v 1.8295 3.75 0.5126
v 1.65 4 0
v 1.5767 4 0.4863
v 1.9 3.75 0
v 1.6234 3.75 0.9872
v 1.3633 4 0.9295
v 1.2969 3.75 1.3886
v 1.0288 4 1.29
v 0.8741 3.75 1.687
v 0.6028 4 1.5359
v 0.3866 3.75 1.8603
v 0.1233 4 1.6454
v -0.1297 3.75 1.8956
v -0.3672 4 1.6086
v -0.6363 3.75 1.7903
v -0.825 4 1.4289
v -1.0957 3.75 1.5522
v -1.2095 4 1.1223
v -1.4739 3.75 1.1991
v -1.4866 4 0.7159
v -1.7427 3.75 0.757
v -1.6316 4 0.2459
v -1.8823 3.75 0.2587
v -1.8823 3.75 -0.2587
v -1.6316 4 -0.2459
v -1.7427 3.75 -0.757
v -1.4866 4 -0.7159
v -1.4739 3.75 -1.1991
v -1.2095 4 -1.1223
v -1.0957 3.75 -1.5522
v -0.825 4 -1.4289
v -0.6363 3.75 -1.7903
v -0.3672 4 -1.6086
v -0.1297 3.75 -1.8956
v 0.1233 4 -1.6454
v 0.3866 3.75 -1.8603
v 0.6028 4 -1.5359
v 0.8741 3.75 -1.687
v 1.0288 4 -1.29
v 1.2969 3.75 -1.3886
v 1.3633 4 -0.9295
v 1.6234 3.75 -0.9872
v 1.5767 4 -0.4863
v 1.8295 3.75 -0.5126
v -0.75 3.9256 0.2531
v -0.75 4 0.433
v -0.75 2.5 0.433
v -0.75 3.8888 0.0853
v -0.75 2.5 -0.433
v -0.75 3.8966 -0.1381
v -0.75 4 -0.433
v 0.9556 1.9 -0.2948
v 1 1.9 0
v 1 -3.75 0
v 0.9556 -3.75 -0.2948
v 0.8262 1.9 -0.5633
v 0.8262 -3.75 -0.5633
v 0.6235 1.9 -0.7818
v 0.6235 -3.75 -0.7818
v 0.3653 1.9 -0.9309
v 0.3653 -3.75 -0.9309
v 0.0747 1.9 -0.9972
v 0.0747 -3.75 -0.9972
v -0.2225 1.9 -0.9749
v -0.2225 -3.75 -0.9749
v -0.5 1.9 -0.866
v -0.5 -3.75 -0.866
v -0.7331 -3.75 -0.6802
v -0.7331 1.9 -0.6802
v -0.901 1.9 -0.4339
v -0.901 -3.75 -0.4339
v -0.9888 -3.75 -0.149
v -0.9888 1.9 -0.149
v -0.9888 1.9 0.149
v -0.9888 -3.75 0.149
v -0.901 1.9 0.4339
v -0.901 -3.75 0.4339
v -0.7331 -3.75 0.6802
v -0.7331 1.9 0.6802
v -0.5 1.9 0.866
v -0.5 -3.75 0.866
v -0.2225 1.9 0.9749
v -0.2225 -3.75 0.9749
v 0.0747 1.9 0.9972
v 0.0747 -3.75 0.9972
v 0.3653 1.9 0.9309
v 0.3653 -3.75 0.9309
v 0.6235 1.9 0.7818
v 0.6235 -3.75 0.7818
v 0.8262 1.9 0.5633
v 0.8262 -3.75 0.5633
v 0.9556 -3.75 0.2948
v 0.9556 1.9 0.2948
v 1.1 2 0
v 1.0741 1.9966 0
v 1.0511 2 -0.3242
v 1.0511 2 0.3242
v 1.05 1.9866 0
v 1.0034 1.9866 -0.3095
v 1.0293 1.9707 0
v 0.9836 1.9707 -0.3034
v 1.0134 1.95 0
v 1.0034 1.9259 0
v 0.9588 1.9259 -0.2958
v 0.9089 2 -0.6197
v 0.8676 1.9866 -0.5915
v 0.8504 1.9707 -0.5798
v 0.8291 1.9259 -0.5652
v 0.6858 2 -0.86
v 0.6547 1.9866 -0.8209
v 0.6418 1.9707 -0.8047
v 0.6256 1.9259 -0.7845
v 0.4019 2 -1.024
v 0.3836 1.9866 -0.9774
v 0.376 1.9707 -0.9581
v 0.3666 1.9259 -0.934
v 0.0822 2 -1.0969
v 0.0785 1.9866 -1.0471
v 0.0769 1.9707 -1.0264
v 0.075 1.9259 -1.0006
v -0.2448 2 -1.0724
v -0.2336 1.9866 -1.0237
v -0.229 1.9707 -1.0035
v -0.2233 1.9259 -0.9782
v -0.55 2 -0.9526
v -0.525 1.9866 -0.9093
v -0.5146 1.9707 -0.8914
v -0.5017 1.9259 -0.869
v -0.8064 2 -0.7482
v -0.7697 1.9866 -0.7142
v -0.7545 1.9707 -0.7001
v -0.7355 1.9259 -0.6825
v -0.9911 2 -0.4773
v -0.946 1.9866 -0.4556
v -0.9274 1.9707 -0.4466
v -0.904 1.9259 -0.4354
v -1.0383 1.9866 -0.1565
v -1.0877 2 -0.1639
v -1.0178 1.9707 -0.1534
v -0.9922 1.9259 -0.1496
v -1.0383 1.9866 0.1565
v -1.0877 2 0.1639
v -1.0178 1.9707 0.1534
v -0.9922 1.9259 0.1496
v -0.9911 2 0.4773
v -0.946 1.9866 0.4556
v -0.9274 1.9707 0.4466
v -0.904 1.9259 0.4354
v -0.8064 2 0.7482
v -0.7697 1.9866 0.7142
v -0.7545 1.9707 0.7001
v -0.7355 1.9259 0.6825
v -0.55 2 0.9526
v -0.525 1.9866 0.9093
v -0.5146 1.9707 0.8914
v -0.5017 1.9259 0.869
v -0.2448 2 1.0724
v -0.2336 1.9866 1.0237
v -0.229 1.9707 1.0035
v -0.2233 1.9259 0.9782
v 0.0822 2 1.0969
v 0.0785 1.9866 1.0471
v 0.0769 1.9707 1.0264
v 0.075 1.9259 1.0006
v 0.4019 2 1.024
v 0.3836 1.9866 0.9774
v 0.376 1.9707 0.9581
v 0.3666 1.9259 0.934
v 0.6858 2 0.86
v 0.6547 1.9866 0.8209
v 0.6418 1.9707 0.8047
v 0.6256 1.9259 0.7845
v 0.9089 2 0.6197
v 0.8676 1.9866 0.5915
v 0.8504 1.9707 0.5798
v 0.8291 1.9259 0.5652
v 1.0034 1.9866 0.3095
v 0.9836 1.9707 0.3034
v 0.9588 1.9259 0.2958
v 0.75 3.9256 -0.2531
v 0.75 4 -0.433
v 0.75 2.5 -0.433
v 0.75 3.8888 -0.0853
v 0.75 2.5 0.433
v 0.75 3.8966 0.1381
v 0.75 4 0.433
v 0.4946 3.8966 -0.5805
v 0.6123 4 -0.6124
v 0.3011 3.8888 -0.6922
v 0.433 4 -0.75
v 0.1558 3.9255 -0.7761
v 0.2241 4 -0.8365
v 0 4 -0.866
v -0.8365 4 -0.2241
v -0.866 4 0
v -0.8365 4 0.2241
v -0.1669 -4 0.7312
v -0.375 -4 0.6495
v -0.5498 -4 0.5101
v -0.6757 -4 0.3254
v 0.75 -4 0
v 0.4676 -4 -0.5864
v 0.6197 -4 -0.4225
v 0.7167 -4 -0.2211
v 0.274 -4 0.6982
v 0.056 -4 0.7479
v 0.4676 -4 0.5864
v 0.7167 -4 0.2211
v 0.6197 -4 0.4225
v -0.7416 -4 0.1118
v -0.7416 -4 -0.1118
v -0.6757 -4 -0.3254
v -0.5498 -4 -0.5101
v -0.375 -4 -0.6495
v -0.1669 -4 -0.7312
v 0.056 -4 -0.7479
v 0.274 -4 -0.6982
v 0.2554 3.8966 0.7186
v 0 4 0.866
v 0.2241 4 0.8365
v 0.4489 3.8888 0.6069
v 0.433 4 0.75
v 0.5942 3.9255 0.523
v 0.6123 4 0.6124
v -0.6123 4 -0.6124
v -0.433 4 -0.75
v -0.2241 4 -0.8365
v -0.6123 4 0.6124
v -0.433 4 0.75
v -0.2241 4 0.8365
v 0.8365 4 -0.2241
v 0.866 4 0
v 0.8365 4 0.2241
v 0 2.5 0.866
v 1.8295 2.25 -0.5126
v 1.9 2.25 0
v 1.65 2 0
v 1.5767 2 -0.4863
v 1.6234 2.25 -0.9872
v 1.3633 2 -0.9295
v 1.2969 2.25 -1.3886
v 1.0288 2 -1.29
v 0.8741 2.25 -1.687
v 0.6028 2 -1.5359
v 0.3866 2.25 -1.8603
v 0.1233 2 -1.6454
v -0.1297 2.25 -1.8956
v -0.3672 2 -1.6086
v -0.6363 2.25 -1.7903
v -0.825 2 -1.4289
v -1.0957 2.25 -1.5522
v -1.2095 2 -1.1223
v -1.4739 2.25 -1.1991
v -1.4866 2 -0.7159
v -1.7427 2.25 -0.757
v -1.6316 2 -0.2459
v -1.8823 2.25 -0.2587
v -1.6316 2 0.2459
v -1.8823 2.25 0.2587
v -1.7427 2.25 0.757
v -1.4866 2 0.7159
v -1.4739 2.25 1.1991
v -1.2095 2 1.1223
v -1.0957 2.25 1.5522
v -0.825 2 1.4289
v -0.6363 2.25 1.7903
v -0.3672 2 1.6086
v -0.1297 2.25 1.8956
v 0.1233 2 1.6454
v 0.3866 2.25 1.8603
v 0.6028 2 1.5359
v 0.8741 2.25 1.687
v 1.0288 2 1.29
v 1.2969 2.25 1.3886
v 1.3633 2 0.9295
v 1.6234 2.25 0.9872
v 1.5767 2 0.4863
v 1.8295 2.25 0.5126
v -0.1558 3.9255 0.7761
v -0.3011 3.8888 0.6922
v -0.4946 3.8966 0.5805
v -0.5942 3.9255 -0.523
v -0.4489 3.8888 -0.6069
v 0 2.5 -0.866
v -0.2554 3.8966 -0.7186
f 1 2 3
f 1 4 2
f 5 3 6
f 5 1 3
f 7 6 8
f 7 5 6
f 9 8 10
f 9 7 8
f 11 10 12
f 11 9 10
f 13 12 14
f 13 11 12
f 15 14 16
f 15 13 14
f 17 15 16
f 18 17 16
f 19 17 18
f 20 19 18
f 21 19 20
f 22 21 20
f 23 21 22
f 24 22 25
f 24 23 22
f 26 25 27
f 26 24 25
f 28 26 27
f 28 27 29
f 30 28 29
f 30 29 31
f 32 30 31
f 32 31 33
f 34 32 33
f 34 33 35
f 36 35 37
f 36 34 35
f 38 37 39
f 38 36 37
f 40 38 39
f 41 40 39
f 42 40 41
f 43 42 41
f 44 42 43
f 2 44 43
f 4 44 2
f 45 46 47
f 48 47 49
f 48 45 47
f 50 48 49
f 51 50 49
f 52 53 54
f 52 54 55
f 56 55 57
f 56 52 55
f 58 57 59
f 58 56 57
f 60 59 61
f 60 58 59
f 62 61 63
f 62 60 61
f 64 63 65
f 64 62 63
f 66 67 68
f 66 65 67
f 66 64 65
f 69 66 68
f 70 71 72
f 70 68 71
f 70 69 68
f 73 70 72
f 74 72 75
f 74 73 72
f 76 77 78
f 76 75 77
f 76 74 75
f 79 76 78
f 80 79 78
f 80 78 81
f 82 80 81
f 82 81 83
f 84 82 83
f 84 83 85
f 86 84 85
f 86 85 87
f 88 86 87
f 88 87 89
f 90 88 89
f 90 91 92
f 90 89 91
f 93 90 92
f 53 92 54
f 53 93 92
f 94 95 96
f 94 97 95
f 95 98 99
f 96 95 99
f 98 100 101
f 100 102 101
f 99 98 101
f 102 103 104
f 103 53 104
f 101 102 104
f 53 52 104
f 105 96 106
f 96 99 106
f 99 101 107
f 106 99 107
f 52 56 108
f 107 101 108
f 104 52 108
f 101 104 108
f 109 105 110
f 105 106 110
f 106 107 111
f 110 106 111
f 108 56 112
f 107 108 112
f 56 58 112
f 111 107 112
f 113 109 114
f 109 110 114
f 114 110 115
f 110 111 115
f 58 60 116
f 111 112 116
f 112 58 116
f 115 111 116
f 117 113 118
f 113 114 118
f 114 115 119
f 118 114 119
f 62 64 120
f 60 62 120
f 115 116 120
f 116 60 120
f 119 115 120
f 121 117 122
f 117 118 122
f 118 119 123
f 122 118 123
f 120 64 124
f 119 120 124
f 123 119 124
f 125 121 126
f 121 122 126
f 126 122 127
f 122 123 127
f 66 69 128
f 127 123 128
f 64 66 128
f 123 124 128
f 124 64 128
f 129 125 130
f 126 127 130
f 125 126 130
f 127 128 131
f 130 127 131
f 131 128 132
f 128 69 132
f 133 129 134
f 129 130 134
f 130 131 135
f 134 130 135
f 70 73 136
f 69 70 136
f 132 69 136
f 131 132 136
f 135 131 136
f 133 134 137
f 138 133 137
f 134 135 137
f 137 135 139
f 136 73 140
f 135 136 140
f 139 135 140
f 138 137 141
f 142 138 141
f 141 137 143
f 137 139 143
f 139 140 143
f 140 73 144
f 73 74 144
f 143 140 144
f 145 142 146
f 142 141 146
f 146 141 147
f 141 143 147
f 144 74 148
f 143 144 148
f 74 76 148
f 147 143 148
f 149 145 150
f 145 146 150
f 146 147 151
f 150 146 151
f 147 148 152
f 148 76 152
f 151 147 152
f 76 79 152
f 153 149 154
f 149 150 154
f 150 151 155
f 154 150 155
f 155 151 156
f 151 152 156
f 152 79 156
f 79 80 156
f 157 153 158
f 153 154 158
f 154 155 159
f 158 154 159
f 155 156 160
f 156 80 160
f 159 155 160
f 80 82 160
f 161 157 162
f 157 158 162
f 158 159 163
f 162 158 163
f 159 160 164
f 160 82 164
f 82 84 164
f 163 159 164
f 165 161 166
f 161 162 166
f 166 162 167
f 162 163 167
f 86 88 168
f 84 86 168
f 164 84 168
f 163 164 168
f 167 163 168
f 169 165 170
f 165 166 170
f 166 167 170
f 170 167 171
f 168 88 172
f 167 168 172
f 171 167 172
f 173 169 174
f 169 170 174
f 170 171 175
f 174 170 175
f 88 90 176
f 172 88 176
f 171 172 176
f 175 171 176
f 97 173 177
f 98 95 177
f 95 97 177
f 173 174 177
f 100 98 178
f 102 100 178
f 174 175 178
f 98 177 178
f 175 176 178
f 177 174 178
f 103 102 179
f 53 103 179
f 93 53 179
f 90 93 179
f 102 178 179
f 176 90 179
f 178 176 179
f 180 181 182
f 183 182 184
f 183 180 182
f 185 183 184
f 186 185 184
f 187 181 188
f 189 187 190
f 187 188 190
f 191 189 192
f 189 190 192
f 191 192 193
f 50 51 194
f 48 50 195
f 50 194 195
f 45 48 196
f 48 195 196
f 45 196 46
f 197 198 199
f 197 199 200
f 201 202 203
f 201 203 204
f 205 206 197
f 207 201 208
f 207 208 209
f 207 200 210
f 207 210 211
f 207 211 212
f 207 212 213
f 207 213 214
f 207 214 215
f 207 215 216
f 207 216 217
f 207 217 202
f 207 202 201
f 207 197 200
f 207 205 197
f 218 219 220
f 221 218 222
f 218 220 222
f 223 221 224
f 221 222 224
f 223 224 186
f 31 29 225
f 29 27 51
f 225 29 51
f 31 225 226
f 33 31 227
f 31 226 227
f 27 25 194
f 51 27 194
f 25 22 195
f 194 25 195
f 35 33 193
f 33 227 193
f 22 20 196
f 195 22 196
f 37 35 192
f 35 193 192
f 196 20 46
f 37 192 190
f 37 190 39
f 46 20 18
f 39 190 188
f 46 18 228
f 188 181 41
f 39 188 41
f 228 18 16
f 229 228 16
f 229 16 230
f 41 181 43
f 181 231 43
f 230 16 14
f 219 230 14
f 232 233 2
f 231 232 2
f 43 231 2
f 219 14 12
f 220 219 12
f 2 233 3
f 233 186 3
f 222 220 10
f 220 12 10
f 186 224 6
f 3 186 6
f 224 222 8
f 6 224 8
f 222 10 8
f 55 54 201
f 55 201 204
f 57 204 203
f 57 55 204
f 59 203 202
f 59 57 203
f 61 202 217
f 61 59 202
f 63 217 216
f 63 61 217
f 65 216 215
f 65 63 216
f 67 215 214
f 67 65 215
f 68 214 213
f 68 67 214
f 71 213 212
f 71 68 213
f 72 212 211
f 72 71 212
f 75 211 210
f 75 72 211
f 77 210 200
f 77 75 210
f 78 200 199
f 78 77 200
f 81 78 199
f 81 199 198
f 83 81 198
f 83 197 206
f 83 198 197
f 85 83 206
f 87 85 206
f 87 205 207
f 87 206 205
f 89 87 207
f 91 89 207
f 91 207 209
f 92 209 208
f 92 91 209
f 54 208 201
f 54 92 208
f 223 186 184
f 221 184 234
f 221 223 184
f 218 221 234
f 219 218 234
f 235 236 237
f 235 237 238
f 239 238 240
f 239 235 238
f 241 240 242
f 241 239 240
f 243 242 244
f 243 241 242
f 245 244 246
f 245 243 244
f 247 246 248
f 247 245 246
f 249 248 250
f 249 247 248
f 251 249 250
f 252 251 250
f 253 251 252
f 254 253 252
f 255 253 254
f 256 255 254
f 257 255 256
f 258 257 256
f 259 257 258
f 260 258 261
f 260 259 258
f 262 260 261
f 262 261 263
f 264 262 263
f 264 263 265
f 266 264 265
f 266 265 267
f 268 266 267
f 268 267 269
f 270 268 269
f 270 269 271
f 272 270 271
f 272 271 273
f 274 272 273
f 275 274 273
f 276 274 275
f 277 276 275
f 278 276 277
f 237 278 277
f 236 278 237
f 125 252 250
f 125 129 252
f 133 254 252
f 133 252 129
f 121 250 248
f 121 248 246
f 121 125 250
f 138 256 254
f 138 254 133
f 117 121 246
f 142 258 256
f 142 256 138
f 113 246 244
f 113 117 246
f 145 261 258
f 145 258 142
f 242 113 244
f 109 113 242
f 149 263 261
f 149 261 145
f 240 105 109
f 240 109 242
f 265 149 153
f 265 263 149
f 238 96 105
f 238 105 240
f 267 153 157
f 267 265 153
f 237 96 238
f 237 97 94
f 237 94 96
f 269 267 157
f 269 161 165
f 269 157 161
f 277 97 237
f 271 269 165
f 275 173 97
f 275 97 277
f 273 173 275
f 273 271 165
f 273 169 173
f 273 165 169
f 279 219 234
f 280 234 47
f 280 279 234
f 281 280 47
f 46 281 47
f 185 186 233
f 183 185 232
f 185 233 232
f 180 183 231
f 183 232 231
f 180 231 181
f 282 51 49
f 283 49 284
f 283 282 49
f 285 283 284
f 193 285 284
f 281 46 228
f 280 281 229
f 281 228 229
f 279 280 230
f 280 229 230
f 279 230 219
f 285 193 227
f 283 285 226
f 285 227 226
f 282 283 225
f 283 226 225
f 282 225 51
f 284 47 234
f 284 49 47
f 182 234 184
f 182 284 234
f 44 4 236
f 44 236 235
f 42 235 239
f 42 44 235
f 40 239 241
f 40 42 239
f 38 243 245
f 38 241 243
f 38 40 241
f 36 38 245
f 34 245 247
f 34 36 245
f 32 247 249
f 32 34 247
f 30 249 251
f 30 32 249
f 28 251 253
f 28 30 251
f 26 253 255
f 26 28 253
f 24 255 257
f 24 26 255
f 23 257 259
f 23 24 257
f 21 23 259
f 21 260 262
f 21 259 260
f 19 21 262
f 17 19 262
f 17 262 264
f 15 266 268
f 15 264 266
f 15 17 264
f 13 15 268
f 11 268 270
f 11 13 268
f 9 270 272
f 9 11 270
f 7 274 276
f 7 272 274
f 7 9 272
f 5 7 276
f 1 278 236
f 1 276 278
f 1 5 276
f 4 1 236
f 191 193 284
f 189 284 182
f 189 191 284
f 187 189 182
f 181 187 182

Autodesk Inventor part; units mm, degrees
ref_plane "YZ Plane" through (0, 0, 0) normal (1, 0, 0) x (0, 1, 0)
ref_plane "XZ Plane" through (0, 0, 0) normal (0, 1, 0) x (-1, 0, 0)
ref_plane "XY Plane" through (0, 0, 0) normal (0, 0, 1) x (1, 0, 0)
sketch "Sketch1" plane through (0, 0, 0) normal (0, 0, 1) x (1, 0, 0)
  line L0 (0, 4) -> (0, -4)
  line L1 (0, -4) -> (0.75, -4)
  line L2 (0.75, -4) -> (1, -3.75)
  line L3 (1, -3.75) -> (1, 1.9)
  line L4 (1.1, 2) -> (1.65, 2)
  line L5 (1.9, 2.25) -> (1.9, 3.75)
  line L6 (1.65, 4) -> (0, 4)
  arc A0 (1.1, 2) -> (1, 1.9) centre (1.1, 1.9) ccw
  line L7 (1.65, 4) -> (1.9, 3.75)
  line L8 (1.65, 2) -> (1.9, 2.25)
  point P0 (0, 0)
  point P1 (1.9, 2)
  point P2 (1.9, 4)
  point P3 (0, 0)
  dimension "d0" = 3.8
  dimension "d1" = 2
  dimension "d3" = 2
  dimension "d4" = 2.2
  dimension "d5" = 135
  dimension "d6" = 0.25
  dimension "d7" = 6
  dimension "d18" = 0.25
revolve "Revolution1" add sketch "Sketch1" angle 360 about axis through (0, 4, 0) along (0, -1, 0)
sketch "Sketch2" plane through (0, 4, 0) normal (0, 1, 0) x (1, 0, 0)
  line L0 (0, -0.866) -> (-0.75, -0.433)
  line L1 (-0.75, -0.433) -> (-0.75, 0.433)
  line L2 (-0.75, 0.433) -> (0, 0.866)
  line L3 (0, 0.866) -> (0.75, 0.433)
  line L4 (0.75, 0.433) -> (0.75, -0.433)
  line L5 (0.75, -0.433) -> (0, -0.866)
  point P0 (0, 0)
  point P1 (0, 0)
  dimension "d11" = 1.5
extrude "Extrusion1" cut sketch "Sketch2" against normal blind 1.5
thread "Thread1" size "M2x0.4" class "6g" standard "ANSI Metric M Profile" full length
sketch "Sketch3" plane through (0, 0, 0) normal (1, 0, 0) x (0, 1, 0)
  line L0 (4, 0.866) -> (4, 0.433) projected
  line L1 (4, 0.866) -> (3.5, 0.366)
  line L2 (3.5, 0.366) -> (4, 0.366)
  line L3 (4, 0.366) -> (4, 0.866)
  line L4 (-0.8, 0) -> (4.8, 0) projected
  point P0 (0, 0)
  dimension "d16" = 0.5
revolve "Revolution2" cut sketch "Sketch3" angle 360 about axis through (0, -10, 0) along (0, 1, 0)
properties part number "Bolt_M2x0.4_6mm_SH" material "Stainless Steel"
